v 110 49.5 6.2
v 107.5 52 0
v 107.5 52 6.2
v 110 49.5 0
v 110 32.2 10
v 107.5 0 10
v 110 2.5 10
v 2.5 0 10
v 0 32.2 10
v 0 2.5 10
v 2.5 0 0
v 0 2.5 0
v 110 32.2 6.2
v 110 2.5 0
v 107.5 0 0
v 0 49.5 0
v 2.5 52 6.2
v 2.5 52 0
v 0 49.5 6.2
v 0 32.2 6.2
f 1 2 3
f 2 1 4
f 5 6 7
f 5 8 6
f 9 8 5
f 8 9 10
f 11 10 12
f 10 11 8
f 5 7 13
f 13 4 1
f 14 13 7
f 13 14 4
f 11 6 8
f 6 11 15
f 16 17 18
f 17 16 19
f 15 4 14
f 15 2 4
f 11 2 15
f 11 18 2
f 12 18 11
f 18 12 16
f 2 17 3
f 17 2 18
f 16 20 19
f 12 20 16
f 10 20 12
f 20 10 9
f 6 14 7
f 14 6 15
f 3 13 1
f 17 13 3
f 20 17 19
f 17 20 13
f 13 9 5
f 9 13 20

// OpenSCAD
$fn = 32;

// ----------------------------------------------------------------------
// Stepped bar: sidestep, 110 x 52 x 10/6.2 mm
// ----------------------------------------------------------------------

// --- parameters (mm) ---
bar_l = 110;              // bar length, X
bar_w = 52;               // bar width, Y
plate_t = 10;             // thickness of the thick zone, Z
thin_t = 6.2;             // thickness of the thin zone
corner_c = 2.5;           // corner chamfer of the bar
step_cut = 3.8;           // material removed from the thin zone
ledge_y = 32.2;           // start of the ledge from the front edge
depth_1 = 3.8;            // depth of cut 1 from the top face

profile = [[2.5, 0], [107.5, 0], [110, 2.5], [110, 49.5], [107.5, 52], [2.5, 52], [0, 49.5], [0, 2.5]];  // primary outline, 8 points, counter clockwise
void_1 = [[-1, 32.2], [111, 32.2], [111, 53], [-1, 53]];  // ledge cut along one edge, 4 points

// --- the one profile operation ---
difference() {
  linear_extrude(height = plate_t) polygon(points = profile);
  translate([0, 0, plate_t - depth_1])
    linear_extrude(height = depth_1 + 1) polygon(points = void_1);
}
